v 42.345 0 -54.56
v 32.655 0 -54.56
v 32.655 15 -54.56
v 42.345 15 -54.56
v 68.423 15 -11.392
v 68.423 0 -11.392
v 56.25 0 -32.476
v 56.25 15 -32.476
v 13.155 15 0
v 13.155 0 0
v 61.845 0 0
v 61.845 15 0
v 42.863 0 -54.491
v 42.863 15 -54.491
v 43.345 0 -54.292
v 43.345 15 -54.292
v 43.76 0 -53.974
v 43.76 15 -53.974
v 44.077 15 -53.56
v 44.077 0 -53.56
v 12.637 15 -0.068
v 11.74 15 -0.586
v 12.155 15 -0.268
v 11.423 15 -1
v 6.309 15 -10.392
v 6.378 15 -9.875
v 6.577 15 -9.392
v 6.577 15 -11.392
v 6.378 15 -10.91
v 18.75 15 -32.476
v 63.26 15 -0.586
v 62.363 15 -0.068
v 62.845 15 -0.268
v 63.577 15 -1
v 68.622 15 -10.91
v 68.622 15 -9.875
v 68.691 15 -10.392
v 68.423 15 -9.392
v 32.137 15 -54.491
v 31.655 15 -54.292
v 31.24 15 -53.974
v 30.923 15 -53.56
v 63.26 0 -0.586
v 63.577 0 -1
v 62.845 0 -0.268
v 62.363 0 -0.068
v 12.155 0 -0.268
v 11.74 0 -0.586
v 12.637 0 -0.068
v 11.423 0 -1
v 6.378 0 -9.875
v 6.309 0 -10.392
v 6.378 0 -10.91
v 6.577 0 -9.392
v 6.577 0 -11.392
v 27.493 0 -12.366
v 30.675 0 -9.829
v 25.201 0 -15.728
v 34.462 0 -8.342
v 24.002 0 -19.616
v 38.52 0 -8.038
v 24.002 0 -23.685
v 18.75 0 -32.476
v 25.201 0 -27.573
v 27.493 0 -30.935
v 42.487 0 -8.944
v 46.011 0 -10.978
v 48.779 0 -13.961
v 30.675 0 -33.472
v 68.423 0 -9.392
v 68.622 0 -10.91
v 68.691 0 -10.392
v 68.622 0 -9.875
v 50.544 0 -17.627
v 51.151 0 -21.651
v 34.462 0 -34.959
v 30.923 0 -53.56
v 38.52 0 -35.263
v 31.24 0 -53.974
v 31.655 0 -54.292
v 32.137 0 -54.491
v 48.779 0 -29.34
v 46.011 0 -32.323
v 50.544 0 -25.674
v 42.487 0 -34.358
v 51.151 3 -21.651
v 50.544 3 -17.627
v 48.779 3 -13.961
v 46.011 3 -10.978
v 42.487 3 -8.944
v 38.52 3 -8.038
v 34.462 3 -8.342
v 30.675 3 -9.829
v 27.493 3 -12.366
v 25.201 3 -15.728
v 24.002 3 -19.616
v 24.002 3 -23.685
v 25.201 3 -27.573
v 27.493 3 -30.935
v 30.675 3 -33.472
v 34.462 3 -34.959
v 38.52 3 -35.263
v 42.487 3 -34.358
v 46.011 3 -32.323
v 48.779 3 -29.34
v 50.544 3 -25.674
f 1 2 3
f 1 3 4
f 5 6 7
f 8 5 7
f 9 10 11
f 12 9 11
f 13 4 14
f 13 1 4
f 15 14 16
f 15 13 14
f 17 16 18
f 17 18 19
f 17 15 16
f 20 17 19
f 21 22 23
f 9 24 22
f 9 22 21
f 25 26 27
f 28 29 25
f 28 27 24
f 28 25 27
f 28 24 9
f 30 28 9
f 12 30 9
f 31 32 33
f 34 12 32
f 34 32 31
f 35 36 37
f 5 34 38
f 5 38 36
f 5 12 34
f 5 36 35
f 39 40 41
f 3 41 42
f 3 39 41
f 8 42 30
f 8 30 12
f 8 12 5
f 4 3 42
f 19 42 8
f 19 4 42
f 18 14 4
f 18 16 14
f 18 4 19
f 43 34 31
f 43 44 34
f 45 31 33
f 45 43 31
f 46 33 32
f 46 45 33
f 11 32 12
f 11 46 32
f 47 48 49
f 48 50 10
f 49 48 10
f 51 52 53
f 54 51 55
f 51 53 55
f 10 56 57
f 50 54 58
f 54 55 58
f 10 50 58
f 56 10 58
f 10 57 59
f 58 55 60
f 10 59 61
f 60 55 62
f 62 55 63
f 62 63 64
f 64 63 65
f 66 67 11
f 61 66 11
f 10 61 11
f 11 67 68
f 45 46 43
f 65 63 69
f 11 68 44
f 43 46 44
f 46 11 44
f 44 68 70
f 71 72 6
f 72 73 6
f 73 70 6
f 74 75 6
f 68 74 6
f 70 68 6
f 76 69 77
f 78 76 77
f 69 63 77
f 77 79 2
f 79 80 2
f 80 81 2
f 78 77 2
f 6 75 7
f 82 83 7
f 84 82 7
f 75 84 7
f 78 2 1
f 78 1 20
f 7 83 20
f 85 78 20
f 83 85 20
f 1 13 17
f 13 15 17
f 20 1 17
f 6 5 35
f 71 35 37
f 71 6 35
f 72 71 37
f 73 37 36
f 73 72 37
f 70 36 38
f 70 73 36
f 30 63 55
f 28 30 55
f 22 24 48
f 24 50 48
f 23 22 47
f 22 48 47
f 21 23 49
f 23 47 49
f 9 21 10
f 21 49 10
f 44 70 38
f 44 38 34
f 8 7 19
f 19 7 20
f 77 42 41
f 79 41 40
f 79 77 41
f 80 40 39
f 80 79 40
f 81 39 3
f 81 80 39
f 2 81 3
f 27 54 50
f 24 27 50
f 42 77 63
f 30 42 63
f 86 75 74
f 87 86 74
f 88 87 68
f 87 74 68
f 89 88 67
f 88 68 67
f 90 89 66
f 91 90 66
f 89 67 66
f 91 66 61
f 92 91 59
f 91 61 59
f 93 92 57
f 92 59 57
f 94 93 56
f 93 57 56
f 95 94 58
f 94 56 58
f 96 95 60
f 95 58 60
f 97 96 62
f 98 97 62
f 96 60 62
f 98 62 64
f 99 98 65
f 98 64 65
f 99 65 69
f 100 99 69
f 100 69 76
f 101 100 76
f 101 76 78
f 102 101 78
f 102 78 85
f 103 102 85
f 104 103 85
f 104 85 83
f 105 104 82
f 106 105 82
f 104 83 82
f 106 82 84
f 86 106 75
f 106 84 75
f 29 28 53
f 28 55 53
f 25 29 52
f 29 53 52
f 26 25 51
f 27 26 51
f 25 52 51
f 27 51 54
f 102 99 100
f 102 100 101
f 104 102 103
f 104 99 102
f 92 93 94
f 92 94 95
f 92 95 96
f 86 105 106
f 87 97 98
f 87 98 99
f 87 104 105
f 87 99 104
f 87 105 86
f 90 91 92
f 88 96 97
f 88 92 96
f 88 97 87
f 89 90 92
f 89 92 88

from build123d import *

# Parameters (mm, degrees)
SKETCH2_R               = 21.650635095
BOSS_EXTRUDE1_DEPTH     = 15
CUT_EXTRUDE1_DEPTH      = 1
CUT_EXTRUDE1_DEPTH_BACK = 16
FILLET1_R               = 2
SKETCH4_R               = 13.650635095
CUT_EXTRUDE2_DEPTH      = 3


with BuildPart() as part:
    # Sketch2 → Boss-Extrude1 (new body)
    with BuildSketch(Plane(origin=(0, 0, 0), x_dir=(1, 0, 0), z_dir=(0, 1, 0))):
        with Locations((37.5, 21.650635095)):
            Circle(SKETCH2_R)
        with BuildLine():
            Line((18.749999007, 32.475950921), (0, 0))
            Line((0, 0), (37.5, 0))
            ThreePointArc((37.5, 0), (18.750000497, 10.825316687), (18.749999007, 32.475950921))
        make_face()
        with BuildLine():
            Line((37.5, 64.951905284), (18.749999007, 32.475950921))
            ThreePointArc((18.749999007, 32.475950921), (37.499999914, 43.301270189), (56.250000907, 32.47595107))
            Line((56.250000907, 32.47595107), (37.5, 64.951905284))
        make_face()
        with BuildLine():
            ThreePointArc((59.150635095, 21.650635095), (52.809310892, 6.341324202), (37.5, 0))
            Line((37.5, 0), (75, 0))
            Line((75, 0), (56.250000907, 32.47595107))
            ThreePointArc((56.250000907, 32.47595107), (58.412907828, 27.254230919), (59.150635095, 21.650635095))
        make_face()
    extrude(amount=BOSS_EXTRUDE1_DEPTH)

    # Sketch3 → Cut-Extrude1 (cut, two sides)
    with BuildSketch(Plane(origin=(0, 15, 0), x_dir=(1, 0, 0), z_dir=(0, 1, 0))) as cut_extrude1_sk:
        Polygon((31.5, 54.559600438), (43.5, 54.559600438), (37.5, 64.951905284), align=None)
        Polygon((0, 0), (6, 10.392304845), (12, 0), align=None)
        Polygon((75, 0), (69, 10.392304845), (63, 0), align=None)
    extrude(amount=CUT_EXTRUDE1_DEPTH, mode=Mode.SUBTRACT)
    extrude(cut_extrude1_sk.sketch, amount=-CUT_EXTRUDE1_DEPTH_BACK, mode=Mode.SUBTRACT)

    # Fillet1
    fillet1_edges = [part.edges().sort_by_distance(p)[0] for p in [
        (31.5, 7.5, -54.559600438),
        (43.5, 7.5, -54.559600438),
        (12, 7.5, 0),
        (6, 7.5, -10.392304845),
        (63, 7.5, 0),
        (69, 7.5, -10.392304845),
    ]]
    fillet(fillet1_edges, radius=FILLET1_R)

    # Sketch4 → Cut-Extrude2 (cut)
    with BuildSketch(Plane.XZ):
        with Locations((37.5, -21.650635095)):
            Circle(SKETCH4_R)
    extrude(amount=-CUT_EXTRUDE2_DEPTH, mode=Mode.SUBTRACT)


solid = part.part
